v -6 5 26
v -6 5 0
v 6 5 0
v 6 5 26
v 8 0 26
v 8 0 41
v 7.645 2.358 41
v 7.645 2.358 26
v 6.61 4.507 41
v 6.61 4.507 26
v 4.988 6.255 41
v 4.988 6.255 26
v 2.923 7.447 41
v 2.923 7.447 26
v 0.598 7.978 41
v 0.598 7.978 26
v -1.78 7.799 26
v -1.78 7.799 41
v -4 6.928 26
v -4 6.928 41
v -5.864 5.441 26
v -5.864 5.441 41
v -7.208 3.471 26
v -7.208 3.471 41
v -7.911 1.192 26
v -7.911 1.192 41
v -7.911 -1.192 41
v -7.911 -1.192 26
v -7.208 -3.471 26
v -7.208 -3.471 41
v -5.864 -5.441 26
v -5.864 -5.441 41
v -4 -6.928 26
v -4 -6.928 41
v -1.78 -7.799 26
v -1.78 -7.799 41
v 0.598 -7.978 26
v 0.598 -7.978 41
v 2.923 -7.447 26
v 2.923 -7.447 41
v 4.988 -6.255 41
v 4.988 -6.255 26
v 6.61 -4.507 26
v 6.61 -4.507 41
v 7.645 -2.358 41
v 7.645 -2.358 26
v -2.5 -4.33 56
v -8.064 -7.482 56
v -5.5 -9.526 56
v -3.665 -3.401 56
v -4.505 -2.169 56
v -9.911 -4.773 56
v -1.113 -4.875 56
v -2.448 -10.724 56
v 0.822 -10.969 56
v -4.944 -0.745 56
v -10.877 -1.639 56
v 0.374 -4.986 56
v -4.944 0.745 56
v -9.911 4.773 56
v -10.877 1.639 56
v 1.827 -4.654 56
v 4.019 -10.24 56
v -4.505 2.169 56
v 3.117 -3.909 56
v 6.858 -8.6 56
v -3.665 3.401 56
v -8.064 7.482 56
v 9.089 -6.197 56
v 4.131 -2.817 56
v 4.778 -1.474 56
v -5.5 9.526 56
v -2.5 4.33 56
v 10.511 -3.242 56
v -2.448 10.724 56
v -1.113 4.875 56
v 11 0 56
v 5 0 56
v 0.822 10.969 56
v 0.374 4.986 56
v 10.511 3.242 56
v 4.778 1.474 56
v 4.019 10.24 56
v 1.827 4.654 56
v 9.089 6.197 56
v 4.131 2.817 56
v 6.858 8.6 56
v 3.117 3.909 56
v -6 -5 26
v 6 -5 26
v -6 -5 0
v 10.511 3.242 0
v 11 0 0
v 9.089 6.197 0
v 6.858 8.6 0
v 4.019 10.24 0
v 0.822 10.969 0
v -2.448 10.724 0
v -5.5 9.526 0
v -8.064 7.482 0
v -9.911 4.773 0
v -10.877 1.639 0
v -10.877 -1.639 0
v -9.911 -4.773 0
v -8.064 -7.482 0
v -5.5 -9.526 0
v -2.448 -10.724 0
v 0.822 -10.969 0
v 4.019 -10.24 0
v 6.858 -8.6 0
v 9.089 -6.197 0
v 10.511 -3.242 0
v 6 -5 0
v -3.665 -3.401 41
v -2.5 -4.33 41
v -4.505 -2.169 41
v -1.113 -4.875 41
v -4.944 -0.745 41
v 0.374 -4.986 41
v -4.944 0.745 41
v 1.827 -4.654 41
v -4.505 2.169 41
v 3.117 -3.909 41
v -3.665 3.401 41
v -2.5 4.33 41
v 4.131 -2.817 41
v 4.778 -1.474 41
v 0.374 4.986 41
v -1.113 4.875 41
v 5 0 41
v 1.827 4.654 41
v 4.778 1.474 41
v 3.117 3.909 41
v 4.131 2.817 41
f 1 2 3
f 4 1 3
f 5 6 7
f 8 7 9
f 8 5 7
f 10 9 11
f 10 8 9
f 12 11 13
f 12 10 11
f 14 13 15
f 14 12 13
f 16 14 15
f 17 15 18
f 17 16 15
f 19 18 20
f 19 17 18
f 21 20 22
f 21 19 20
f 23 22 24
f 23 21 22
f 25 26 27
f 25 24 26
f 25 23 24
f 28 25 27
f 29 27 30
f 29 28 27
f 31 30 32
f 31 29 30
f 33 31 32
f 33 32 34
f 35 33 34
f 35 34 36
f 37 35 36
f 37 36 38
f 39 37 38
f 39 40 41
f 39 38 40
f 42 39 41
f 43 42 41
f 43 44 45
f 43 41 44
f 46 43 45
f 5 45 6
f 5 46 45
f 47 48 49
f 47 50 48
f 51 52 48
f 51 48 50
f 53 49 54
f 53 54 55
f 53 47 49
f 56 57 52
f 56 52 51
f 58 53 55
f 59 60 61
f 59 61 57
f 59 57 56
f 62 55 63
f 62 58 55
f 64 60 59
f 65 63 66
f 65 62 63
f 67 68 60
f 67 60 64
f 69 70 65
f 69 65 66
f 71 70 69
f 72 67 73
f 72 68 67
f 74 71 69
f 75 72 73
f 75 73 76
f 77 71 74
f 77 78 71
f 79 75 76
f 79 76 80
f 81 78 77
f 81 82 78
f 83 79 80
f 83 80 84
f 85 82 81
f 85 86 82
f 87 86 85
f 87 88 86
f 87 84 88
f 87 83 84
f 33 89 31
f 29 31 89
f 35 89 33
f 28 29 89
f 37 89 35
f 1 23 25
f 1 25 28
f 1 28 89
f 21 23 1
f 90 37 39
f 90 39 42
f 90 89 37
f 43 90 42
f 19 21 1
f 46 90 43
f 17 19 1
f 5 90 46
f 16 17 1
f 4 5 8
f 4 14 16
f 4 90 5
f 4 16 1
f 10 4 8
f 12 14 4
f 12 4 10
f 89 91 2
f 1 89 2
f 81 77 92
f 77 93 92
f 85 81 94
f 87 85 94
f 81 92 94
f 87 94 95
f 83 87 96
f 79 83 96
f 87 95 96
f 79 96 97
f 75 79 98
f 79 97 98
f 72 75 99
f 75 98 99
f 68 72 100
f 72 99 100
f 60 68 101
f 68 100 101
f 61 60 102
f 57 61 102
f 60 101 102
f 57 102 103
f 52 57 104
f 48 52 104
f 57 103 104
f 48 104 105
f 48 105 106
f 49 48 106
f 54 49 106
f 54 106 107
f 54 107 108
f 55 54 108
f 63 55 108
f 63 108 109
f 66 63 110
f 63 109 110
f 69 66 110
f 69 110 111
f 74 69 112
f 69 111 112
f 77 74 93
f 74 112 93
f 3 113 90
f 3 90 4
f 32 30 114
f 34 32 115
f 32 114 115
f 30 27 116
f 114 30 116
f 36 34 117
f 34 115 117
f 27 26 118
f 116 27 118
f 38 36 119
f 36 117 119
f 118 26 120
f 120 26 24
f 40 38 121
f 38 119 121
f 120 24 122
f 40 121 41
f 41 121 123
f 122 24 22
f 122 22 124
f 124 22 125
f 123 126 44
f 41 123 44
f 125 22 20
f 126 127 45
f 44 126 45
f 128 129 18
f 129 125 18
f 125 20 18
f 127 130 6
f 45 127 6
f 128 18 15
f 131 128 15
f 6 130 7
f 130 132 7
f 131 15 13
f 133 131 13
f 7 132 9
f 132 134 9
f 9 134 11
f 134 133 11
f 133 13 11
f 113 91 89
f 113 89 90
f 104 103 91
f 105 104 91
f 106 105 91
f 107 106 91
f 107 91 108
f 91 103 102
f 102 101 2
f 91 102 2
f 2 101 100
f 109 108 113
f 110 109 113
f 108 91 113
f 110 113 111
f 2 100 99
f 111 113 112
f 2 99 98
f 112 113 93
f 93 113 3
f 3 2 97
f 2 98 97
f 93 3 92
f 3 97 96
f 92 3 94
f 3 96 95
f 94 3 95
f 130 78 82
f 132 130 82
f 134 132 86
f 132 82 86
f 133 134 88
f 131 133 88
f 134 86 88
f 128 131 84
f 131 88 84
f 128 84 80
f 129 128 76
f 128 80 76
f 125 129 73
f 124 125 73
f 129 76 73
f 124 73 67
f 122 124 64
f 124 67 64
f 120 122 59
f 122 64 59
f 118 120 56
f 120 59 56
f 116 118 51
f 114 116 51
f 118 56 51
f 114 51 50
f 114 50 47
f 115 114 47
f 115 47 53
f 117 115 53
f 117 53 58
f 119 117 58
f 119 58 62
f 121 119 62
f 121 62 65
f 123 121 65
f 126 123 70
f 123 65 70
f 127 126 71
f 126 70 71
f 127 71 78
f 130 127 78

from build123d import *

# Parameters (mm, degrees)
CROQUIS1_R              = 11
CROQUIS1_W              = 12
CROQUIS1_H              = 10
SALIENTE_EXTRUIR1_DEPTH = 26
CROQUIS3_R              = 11
CROQUIS3_R_2            = 8
SALIENTE_EXTRUIR2_DEPTH = 30
CROQUIS5_R              = 11
CROQUIS5_R_2            = 5
SALIENTE_EXTRUIR3_DEPTH = 15


with BuildPart() as part:
    # Croquis1 → Saliente-Extruir1 (new body)
    with BuildSketch(Plane.XY):
        Circle(CROQUIS1_R)
        Rectangle(CROQUIS1_W, CROQUIS1_H, mode=Mode.SUBTRACT)
    extrude(amount=SALIENTE_EXTRUIR1_DEPTH)

    # Croquis3 → Saliente-Extruir2 (add)
    with BuildSketch(Plane.XY.offset(26)):
        Circle(CROQUIS3_R)
        Circle(CROQUIS3_R_2, mode=Mode.SUBTRACT)
    extrude(amount=SALIENTE_EXTRUIR2_DEPTH)

    # Croquis5 → Saliente-Extruir3 (add)
    with BuildSketch(Plane.XY.offset(56)):
        Circle(CROQUIS5_R)
        Circle(CROQUIS5_R_2, mode=Mode.SUBTRACT)
    extrude(amount=-SALIENTE_EXTRUIR3_DEPTH)


solid = part.part
